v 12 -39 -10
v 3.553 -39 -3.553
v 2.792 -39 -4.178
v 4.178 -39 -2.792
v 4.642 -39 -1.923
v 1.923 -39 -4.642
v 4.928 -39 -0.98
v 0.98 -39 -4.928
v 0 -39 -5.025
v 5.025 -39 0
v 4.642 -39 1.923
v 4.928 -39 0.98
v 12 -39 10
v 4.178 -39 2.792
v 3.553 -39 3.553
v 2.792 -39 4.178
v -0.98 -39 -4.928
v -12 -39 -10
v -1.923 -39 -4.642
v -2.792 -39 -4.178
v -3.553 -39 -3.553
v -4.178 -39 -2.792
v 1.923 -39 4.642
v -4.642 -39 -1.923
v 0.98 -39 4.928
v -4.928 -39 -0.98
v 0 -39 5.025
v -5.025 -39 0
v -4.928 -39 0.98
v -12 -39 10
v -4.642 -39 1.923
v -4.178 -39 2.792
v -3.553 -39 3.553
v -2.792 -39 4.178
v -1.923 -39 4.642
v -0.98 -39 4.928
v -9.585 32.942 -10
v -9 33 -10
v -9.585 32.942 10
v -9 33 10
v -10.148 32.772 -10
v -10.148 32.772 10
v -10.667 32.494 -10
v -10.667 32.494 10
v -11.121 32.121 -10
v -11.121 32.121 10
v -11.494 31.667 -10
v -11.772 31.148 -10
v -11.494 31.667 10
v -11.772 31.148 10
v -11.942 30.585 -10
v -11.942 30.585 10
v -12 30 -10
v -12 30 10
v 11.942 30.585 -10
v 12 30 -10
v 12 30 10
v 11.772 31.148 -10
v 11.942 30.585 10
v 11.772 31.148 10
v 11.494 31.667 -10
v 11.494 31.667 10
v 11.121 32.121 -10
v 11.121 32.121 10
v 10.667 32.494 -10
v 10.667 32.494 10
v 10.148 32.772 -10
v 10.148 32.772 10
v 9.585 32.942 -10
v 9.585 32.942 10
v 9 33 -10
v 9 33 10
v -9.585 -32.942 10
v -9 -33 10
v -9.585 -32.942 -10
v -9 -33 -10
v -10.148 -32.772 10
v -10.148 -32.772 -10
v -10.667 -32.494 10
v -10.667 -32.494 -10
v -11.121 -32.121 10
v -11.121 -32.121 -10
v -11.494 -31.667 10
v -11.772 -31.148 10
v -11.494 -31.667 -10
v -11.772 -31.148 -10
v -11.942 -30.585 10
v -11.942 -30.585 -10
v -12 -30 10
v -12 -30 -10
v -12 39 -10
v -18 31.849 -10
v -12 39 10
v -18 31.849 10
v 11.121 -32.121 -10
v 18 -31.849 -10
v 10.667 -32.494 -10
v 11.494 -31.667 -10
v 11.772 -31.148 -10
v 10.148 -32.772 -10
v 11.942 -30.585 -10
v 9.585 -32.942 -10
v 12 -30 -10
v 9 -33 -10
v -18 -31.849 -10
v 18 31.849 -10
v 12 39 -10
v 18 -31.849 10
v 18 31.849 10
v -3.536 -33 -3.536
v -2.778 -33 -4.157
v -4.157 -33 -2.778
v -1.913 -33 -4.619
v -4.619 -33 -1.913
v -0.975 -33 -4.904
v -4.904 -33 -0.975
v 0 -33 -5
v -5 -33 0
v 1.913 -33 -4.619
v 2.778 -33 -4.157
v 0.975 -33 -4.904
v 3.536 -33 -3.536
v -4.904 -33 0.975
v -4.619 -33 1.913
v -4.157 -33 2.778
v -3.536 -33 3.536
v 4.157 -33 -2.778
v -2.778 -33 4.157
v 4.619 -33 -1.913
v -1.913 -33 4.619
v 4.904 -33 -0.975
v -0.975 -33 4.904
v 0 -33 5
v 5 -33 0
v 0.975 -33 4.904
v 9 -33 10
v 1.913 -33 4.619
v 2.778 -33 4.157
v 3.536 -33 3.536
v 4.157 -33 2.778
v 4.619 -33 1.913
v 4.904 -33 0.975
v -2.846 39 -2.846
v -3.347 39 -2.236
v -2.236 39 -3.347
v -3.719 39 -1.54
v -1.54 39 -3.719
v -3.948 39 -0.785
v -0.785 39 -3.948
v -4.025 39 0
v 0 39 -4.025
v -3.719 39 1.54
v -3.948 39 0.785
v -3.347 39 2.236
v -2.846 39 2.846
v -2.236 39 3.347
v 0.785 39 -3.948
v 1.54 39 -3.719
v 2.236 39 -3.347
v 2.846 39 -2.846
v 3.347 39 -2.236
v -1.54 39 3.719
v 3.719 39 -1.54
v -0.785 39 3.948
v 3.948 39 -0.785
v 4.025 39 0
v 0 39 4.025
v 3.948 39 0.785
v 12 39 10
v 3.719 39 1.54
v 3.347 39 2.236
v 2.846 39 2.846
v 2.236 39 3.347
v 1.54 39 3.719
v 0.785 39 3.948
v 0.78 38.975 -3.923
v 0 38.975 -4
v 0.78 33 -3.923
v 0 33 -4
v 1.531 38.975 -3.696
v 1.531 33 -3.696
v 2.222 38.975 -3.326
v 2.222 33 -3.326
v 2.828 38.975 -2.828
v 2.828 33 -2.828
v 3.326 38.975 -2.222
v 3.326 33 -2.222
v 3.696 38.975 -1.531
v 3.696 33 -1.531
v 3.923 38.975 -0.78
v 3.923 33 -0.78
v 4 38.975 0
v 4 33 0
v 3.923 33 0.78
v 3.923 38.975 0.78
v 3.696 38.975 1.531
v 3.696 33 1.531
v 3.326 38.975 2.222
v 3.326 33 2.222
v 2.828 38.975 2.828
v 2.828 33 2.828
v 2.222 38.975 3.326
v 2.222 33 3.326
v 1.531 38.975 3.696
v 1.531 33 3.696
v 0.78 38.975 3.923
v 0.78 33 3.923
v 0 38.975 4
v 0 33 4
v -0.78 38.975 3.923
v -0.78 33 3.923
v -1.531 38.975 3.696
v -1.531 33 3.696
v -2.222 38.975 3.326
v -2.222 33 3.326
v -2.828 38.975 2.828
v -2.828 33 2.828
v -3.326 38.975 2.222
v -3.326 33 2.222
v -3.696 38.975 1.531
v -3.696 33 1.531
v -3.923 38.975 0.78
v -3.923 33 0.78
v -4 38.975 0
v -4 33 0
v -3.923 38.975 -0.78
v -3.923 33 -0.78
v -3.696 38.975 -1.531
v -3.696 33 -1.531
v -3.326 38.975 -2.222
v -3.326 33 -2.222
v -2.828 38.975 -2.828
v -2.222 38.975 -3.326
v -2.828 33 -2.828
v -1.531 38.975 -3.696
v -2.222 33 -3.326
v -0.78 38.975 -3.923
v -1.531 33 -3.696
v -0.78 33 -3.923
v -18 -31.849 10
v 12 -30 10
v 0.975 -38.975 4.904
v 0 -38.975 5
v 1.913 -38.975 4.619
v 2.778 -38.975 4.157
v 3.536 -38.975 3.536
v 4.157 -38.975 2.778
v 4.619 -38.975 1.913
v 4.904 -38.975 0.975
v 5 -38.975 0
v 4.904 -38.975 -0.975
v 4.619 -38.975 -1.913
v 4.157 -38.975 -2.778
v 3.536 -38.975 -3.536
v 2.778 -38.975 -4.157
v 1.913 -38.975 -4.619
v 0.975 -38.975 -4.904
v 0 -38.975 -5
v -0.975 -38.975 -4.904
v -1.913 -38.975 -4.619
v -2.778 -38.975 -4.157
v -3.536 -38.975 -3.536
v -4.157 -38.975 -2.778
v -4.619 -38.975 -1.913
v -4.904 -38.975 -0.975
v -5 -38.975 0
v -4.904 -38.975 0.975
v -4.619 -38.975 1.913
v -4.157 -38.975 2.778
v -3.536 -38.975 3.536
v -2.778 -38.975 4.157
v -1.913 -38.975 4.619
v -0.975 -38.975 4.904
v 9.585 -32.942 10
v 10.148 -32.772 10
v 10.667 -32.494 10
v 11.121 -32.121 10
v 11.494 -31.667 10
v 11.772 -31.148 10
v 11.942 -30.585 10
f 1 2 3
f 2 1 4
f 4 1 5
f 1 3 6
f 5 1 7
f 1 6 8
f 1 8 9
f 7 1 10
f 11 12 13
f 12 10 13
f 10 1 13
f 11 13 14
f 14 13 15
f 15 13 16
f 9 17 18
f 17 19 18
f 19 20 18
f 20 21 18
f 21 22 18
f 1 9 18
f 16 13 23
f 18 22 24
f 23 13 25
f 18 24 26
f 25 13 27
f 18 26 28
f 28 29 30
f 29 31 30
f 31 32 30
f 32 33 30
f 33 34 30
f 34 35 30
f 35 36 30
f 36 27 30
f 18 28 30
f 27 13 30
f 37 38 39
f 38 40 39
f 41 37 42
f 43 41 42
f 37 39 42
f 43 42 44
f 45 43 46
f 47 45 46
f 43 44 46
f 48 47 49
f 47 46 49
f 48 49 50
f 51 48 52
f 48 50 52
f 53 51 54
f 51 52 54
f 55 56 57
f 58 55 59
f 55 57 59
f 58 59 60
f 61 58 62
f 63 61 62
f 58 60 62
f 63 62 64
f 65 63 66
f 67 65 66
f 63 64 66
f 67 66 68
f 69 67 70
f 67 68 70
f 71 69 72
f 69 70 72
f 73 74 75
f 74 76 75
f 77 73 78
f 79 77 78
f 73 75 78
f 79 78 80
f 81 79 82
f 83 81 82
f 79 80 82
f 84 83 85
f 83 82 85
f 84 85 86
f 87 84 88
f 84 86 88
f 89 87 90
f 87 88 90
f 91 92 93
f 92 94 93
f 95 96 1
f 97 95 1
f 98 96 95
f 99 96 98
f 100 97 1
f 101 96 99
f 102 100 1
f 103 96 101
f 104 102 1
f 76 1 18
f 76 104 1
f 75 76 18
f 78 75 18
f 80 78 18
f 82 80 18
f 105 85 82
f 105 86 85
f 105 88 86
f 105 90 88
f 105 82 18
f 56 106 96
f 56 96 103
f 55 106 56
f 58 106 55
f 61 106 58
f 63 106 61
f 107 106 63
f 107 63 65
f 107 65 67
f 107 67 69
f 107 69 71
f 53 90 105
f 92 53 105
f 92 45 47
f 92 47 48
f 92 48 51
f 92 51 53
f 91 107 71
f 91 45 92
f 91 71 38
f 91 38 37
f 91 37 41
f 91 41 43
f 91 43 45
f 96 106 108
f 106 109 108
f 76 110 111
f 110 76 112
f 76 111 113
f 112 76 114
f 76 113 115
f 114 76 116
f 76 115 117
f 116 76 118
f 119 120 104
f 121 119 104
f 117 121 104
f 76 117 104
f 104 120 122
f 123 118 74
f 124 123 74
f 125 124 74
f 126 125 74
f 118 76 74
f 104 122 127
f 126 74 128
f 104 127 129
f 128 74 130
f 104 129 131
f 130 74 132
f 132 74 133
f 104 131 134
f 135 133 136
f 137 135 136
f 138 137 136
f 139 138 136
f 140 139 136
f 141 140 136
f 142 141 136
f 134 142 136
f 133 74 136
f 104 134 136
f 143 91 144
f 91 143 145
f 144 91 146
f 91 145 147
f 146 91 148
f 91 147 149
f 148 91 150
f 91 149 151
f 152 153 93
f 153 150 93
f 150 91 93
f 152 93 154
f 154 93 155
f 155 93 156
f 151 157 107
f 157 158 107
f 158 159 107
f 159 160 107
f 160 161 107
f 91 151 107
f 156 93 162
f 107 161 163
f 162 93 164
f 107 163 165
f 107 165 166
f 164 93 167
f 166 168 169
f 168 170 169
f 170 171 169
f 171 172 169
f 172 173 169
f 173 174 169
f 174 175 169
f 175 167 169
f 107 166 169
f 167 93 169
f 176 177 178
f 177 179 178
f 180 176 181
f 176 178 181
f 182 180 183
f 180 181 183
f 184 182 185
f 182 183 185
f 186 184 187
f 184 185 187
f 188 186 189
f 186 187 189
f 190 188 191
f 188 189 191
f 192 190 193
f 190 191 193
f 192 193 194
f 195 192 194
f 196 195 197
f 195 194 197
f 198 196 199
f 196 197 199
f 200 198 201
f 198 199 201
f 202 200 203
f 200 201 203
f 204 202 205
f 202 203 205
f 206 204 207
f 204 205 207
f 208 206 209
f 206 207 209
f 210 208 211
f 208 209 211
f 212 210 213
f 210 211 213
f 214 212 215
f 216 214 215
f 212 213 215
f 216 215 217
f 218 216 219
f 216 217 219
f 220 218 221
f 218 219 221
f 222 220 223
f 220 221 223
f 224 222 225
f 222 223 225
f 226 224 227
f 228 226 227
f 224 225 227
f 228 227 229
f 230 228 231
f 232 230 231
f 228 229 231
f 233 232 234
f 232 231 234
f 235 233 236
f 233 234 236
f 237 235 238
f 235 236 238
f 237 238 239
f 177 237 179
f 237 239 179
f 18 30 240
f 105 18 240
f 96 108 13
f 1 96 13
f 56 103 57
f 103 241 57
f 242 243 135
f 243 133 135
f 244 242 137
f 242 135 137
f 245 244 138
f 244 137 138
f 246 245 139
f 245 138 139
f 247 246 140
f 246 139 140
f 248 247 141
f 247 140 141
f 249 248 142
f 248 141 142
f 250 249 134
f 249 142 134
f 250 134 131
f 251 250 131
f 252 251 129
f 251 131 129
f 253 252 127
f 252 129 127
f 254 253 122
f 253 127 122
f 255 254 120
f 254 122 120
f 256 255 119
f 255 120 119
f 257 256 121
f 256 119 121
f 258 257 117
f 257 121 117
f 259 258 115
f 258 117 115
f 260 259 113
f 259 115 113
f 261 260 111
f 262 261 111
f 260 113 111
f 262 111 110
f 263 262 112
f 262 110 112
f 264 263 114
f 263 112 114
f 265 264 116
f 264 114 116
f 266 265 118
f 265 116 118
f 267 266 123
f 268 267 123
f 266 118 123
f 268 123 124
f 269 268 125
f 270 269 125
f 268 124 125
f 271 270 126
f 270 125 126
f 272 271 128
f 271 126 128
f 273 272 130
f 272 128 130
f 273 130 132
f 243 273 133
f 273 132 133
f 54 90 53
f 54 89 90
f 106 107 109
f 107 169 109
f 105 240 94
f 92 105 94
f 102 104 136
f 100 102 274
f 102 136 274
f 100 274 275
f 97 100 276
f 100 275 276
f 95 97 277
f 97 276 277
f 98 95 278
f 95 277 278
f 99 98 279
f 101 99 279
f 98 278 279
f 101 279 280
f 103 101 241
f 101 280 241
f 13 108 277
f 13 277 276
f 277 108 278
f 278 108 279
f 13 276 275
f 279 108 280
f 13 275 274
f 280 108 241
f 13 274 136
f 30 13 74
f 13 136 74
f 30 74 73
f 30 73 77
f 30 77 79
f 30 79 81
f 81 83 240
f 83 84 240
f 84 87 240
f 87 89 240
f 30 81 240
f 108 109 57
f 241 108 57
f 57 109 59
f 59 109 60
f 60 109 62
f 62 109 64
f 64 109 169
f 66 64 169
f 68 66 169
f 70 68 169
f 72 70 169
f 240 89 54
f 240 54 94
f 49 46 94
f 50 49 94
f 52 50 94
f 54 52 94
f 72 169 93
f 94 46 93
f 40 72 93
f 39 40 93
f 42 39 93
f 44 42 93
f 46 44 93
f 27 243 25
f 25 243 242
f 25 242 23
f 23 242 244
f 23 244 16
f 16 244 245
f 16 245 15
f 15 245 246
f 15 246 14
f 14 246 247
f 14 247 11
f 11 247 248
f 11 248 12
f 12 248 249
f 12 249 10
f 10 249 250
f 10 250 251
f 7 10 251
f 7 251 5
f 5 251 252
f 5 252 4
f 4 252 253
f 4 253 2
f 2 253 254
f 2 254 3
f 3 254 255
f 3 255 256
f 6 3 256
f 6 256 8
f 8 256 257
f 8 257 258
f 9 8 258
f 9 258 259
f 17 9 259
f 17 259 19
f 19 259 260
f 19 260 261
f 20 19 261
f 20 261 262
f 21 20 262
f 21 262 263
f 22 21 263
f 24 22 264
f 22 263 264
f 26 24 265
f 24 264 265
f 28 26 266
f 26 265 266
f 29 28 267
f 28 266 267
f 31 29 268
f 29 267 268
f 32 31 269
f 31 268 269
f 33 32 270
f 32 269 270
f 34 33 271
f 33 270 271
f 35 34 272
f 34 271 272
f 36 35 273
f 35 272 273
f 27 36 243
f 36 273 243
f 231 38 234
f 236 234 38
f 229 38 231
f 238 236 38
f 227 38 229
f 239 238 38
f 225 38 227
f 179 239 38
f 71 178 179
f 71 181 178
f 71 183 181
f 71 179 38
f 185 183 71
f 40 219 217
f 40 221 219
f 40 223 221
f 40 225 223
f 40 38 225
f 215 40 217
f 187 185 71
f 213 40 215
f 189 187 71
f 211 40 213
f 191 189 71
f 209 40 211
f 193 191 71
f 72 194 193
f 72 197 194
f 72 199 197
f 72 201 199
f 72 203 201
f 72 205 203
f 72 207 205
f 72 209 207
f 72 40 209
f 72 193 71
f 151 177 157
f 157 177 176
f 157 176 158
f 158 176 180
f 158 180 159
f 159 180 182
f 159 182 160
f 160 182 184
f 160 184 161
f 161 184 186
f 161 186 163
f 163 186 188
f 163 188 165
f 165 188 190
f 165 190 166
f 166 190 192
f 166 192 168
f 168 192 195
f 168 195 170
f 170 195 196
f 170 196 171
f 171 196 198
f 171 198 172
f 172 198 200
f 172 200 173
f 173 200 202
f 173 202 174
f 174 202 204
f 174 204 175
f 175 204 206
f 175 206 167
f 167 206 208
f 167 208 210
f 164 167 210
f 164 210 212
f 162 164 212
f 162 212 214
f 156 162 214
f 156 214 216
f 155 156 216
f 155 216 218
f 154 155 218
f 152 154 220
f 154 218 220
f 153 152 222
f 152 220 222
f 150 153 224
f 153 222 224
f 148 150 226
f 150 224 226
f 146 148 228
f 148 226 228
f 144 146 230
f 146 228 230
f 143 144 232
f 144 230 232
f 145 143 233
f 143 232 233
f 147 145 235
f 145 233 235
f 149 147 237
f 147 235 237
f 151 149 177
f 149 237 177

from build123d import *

# Parameters (mm, degrees)
SKETCH1_W                        = 24
SKETCH1_H                        = 66
BOSS_EXTRUDE1_DEPTH              = 10
F_8_0MM_DOWEL_HOLE1_D            = 8
F_8_0MM_DOWEL_HOLE1_DEPTH        = 24.5
F_8_0MM_DOWEL_HOLE1_CSINK_D      = 8.05
F_8_0MM_DOWEL_HOLE1_CSINK_ANGLE  = 90
F_8_0MM_DOWEL_HOLE1_TIP          = 2.403442476
F_10_0MM_DOWEL_HOLE2_D           = 10
F_10_0MM_DOWEL_HOLE2_DEPTH       = 24.5
F_10_0MM_DOWEL_HOLE2_CSINK_D     = 10.05
F_10_0MM_DOWEL_HOLE2_CSINK_ANGLE = 90
F_10_0MM_DOWEL_HOLE2_TIP         = 3.004303095
FILLET1_R                        = 3


with BuildPart() as part:
    # Sketch1 → Boss-Extrude1 (new, symmetric)
    with BuildSketch(Plane.XY):
        Polygon((-18, -31.849478444), (-18, 31.849478444), (-12, 39), (12, 39), (18, 31.849478444), (18, -31.849478444), (12, -39), (-12, -39), align=None)
        Rectangle(SKETCH1_W, SKETCH1_H, mode=Mode.SUBTRACT)
    extrude(amount=BOSS_EXTRUDE1_DEPTH, both=True)

    # Ø8.0mm Dowel Hole1
    with Locations(Plane.ZX.offset(39)):
        with Locations((0, 0)):
            CounterSinkHole(F_8_0MM_DOWEL_HOLE1_D / 2, F_8_0MM_DOWEL_HOLE1_CSINK_D / 2, depth=F_8_0MM_DOWEL_HOLE1_DEPTH, counter_sink_angle=F_8_0MM_DOWEL_HOLE1_CSINK_ANGLE)
            with Locations((0, 0, -(F_8_0MM_DOWEL_HOLE1_DEPTH + F_8_0MM_DOWEL_HOLE1_TIP / 2))):  # 118° drill point
                Cone(0, F_8_0MM_DOWEL_HOLE1_D / 2, F_8_0MM_DOWEL_HOLE1_TIP, mode=Mode.SUBTRACT)

    # Ø10.0mm Dowel Hole2
    with Locations(Plane(origin=(0, -39, 0), x_dir=(0, 0, -1), z_dir=(0, -1, 0))):
        with Locations((0, 0)):
            CounterSinkHole(F_10_0MM_DOWEL_HOLE2_D / 2, F_10_0MM_DOWEL_HOLE2_CSINK_D / 2, depth=F_10_0MM_DOWEL_HOLE2_DEPTH, counter_sink_angle=F_10_0MM_DOWEL_HOLE2_CSINK_ANGLE)
            with Locations((0, 0, -(F_10_0MM_DOWEL_HOLE2_DEPTH + F_10_0MM_DOWEL_HOLE2_TIP / 2))):  # 118° drill point
                Cone(0, F_10_0MM_DOWEL_HOLE2_D / 2, F_10_0MM_DOWEL_HOLE2_TIP, mode=Mode.SUBTRACT)

    # Fillet1
    fillet1_edges = [part.edges().sort_by_distance(p)[0] for p in [
        (12, -33, 0),
        (12, 33, 0),
        (-12, 33, 0),
        (-12, -33, 0),
    ]]
    fillet(fillet1_edges, radius=FILLET1_R)


solid = part.part
